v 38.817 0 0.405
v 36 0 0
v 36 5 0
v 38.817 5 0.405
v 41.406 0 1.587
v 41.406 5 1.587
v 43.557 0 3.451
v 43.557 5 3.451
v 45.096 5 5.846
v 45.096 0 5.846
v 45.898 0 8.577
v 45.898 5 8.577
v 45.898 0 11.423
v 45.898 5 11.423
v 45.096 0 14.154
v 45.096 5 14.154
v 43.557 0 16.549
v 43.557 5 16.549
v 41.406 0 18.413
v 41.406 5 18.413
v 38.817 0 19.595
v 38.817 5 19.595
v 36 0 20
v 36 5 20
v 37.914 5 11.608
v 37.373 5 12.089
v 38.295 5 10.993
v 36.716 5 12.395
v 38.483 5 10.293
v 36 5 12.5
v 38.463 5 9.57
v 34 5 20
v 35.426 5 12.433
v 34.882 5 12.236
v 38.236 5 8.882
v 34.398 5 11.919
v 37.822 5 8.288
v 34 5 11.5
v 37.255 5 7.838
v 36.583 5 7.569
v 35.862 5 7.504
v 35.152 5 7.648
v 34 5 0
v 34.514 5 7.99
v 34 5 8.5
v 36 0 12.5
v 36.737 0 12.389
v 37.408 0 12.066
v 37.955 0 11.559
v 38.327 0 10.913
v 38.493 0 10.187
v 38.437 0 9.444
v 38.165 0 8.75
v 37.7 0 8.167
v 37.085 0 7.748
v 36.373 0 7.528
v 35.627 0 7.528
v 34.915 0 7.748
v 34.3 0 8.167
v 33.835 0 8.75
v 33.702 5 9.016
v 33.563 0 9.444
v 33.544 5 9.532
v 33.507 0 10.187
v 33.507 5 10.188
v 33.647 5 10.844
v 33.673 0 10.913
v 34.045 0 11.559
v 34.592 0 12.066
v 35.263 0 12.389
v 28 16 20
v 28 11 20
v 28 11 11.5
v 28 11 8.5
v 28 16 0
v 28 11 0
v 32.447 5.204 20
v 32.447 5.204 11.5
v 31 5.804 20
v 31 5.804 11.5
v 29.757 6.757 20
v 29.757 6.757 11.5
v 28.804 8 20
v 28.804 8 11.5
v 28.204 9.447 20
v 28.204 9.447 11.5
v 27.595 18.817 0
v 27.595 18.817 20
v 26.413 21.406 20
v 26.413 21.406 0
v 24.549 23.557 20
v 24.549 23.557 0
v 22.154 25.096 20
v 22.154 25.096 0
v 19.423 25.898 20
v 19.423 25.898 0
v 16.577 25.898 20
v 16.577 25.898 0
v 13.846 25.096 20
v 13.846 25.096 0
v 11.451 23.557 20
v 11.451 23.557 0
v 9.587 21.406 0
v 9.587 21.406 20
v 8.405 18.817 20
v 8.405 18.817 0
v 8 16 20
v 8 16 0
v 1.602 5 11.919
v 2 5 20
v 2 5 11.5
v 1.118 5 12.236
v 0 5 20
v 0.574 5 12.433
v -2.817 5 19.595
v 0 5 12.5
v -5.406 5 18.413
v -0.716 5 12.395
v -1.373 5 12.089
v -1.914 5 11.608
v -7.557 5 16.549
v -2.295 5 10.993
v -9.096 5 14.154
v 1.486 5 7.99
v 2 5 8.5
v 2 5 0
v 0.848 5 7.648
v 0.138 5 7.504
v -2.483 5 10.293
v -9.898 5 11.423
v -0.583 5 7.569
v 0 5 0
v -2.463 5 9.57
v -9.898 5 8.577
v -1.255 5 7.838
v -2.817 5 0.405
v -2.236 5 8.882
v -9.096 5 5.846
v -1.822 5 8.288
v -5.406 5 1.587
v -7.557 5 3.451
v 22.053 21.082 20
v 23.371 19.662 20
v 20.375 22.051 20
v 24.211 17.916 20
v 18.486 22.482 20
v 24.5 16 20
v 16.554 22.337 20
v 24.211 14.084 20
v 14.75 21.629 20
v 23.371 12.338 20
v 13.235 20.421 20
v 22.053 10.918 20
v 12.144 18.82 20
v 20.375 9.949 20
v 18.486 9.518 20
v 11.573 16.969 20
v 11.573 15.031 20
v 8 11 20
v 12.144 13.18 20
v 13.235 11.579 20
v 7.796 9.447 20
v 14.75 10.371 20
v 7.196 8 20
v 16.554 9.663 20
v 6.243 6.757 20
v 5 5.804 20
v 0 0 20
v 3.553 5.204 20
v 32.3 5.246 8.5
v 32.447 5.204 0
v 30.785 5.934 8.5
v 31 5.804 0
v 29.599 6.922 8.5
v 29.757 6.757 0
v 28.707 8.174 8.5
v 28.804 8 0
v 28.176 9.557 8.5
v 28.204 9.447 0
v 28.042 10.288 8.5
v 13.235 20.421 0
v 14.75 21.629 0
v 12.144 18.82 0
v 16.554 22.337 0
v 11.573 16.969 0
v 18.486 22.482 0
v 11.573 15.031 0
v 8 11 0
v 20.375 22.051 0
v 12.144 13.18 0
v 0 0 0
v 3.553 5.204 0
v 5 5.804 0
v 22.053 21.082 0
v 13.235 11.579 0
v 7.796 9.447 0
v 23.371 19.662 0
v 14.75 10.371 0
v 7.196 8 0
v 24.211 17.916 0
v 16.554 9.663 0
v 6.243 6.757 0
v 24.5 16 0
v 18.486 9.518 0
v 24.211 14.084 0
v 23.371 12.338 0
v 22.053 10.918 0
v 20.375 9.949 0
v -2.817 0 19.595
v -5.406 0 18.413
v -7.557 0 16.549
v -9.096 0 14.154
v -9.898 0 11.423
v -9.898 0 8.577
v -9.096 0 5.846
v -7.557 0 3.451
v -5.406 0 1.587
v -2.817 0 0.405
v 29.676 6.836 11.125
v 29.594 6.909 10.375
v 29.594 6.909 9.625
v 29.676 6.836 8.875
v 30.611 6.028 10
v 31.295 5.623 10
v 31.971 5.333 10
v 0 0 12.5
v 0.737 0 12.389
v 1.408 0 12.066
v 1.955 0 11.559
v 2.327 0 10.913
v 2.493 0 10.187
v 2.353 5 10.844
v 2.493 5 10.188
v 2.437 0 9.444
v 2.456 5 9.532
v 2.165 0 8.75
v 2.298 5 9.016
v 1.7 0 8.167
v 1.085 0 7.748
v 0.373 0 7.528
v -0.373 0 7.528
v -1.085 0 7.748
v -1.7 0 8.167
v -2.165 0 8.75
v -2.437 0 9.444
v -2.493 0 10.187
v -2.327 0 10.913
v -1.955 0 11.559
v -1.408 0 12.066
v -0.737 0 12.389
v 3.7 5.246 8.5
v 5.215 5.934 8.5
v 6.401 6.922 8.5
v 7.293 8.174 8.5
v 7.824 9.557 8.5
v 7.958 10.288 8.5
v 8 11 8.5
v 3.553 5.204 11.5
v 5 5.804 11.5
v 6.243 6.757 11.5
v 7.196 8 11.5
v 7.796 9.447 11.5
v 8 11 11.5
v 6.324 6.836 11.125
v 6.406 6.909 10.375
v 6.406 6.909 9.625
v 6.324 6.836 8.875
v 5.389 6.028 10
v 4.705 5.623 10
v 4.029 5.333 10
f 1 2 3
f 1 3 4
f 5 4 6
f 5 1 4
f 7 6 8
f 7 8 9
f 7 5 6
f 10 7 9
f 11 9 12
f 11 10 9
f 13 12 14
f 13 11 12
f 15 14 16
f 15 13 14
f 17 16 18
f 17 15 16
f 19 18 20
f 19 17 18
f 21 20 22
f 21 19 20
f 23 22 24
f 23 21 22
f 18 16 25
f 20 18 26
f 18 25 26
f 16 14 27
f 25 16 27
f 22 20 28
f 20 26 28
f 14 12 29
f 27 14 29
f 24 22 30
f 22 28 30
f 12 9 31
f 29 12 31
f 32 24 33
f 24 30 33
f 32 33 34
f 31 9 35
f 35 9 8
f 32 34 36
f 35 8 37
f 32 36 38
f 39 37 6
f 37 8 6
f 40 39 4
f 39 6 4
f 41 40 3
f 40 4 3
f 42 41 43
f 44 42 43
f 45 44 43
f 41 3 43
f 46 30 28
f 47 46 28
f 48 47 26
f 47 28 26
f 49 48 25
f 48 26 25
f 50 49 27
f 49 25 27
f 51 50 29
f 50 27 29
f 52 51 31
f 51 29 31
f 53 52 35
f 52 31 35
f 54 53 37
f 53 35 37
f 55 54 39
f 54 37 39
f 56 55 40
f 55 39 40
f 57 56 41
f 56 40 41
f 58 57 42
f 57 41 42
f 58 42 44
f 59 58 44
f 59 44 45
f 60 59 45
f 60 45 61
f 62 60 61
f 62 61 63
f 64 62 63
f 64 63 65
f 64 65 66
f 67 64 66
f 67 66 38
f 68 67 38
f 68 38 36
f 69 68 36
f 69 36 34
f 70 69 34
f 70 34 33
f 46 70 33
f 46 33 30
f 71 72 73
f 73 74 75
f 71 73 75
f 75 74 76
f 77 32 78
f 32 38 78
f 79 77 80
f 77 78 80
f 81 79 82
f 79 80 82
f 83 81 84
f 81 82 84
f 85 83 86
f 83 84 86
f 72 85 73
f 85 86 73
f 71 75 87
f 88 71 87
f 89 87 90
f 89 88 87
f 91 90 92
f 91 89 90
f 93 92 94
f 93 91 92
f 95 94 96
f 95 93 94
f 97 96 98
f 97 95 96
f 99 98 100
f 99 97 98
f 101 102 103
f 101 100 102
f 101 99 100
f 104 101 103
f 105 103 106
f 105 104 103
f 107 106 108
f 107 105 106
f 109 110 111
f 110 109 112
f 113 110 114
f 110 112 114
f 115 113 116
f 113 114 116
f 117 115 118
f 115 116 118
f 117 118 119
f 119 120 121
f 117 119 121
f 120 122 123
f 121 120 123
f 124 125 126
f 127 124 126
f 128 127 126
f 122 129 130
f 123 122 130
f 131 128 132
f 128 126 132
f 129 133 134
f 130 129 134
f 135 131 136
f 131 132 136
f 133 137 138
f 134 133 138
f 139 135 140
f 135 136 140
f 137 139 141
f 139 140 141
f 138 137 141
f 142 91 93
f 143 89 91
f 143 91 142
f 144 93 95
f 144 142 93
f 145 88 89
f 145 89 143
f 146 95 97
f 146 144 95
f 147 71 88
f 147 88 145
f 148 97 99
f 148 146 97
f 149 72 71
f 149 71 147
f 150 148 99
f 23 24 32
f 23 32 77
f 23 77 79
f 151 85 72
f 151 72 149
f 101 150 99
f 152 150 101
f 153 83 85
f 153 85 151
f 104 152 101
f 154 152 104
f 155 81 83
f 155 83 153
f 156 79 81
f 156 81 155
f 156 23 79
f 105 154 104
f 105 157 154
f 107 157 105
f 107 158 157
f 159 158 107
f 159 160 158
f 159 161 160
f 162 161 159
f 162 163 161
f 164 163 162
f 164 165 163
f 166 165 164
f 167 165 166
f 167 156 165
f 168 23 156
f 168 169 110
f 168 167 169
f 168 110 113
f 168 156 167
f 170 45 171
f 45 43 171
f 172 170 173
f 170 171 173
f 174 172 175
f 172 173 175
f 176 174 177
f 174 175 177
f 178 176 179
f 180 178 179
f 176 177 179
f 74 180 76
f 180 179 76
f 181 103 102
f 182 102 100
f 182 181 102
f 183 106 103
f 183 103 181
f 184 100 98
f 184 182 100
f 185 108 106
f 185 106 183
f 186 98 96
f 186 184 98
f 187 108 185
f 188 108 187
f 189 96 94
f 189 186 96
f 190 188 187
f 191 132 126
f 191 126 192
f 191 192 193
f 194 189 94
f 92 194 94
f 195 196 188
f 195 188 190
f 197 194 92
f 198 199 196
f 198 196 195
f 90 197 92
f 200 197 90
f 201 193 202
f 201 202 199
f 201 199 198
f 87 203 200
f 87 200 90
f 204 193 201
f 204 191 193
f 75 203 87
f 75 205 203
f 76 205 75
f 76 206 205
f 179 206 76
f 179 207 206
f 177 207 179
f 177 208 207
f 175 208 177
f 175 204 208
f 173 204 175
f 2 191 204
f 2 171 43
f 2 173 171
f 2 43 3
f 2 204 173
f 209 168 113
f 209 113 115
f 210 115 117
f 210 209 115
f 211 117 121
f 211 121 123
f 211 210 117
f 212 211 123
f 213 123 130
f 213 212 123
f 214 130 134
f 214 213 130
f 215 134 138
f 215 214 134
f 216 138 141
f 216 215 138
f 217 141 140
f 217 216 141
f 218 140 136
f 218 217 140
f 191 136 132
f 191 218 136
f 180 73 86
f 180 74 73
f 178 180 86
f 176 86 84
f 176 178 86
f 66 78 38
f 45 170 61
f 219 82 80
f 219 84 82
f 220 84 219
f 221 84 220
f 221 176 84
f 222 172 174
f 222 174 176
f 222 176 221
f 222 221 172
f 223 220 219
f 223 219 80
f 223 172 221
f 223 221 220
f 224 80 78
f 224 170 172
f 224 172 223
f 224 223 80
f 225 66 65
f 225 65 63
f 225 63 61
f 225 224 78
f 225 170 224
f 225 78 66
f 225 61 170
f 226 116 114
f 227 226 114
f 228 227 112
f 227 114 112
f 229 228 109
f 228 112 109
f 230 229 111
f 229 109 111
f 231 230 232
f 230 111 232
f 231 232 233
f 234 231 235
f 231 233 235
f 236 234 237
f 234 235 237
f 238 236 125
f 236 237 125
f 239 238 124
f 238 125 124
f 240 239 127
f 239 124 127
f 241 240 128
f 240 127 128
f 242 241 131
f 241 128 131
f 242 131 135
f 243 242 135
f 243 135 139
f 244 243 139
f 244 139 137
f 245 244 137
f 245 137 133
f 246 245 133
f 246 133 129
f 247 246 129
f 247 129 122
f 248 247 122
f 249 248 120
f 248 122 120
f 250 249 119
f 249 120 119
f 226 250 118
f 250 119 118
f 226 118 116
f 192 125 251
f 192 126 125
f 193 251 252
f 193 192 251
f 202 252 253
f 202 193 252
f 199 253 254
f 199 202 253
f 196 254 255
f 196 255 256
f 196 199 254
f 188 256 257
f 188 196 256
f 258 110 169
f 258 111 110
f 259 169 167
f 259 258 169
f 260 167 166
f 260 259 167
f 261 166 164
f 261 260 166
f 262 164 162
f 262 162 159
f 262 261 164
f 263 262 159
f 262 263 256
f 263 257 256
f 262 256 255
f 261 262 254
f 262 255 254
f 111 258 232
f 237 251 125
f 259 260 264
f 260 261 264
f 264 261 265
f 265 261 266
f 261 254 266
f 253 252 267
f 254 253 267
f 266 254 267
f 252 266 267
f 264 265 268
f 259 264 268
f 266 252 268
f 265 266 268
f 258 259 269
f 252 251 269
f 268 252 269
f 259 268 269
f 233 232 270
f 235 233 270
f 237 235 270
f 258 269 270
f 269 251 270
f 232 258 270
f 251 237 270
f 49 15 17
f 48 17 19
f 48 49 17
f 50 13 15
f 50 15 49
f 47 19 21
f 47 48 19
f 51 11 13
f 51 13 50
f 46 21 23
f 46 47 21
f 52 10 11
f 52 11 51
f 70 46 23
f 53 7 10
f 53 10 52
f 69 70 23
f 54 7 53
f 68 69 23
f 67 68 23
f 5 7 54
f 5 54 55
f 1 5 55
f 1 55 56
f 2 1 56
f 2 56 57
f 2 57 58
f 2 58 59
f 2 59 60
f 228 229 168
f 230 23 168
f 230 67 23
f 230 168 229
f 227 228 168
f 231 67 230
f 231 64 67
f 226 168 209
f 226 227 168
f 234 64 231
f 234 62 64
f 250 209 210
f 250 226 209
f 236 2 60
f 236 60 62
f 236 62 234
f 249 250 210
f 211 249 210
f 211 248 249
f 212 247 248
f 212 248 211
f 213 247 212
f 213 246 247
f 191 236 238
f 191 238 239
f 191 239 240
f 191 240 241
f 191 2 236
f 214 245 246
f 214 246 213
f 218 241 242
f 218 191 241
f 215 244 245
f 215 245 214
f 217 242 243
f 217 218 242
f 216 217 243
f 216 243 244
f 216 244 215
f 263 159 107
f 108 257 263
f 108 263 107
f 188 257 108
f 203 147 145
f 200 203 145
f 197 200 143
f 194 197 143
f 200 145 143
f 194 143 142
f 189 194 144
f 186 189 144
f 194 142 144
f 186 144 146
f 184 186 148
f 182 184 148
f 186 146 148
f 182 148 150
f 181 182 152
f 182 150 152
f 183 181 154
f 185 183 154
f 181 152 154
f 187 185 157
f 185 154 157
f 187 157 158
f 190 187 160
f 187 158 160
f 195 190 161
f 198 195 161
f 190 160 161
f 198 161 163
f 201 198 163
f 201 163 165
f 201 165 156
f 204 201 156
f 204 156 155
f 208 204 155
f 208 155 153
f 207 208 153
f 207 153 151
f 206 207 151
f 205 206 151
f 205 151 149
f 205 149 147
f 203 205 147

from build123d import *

# Parameters (mm, degrees)
ESTRUSIONE_ESTRUSIONE1_DEPTH = 5
SCHIZZO2_W                   = 20
SCHIZZO2_H                   = 20
ESTRUSIONE_ESTRUSIONE2_DEPTH = 21
RACCORDO1_RADIUS             = 10
RACCORDO1_LENGTH             = 20
SCHIZZO5_R                   = 6.5
TAGLIO_ESTRUSIONE4_DEPTH     = 57.497787567
SCHIZZO6_R                   = 2.5
TAGLIO_ESTRUSIONE5_DEPTH     = 55.378304497
RACCORDO2_R                  = 6


with BuildPart() as part:
    # Schizzo1 → Estrusione-Estrusione1 (new body)
    with BuildSketch(Plane(origin=(0, 0, 0), x_dir=(1, 0, 0), z_dir=(0, 1, 0))):
        with BuildLine():
            Line((0, 0), (36, 0))
            ThreePointArc((36, 0), (46, -10), (36, -20))
            Line((36, -20), (0, -20))
            ThreePointArc((0, -20), (-10, -10), (0, 0))
        make_face()
    extrude(amount=ESTRUSIONE_ESTRUSIONE1_DEPTH)

    # Schizzo2 → Estrusione-Estrusione2 (add)
    with BuildSketch(Plane(origin=(0, 5, 0), x_dir=(1, 0, 0), z_dir=(0, 1, 0))):
        with Locations((18, -10)):
            Rectangle(SCHIZZO2_W, SCHIZZO2_H)
    extrude(amount=ESTRUSIONE_ESTRUSIONE2_DEPTH)

    # Raccordo1: full round fillet: the end face becomes a half cylinder, R = half its width
    raccordo1_face = Plane((18, 26, 10), x_dir=(0, 0, 1), z_dir=(0, 1, 0))  # on the end face: x along it, z out of the body
    raccordo1_slab = raccordo1_face.offset(-RACCORDO1_RADIUS / 2) * Box(RACCORDO1_LENGTH, 2 * RACCORDO1_RADIUS, RACCORDO1_RADIUS, mode=Mode.PRIVATE)  # the body's end, R deep
    raccordo1_round = Plane((18, 16, 10), x_dir=(0, 1, 0), z_dir=(0, 0, 1)) * Cylinder(RACCORDO1_RADIUS, RACCORDO1_LENGTH, mode=Mode.PRIVATE)  # its axis R under the face
    add(raccordo1_slab - raccordo1_round, mode=Mode.SUBTRACT)

    # Schizzo5 → Taglio-Estrusione4 (cut, through all)
    with BuildSketch(Plane.XY.offset(20)):
        with Locations((18, 16)):
            Circle(SCHIZZO5_R)
    extrude(amount=-TAGLIO_ESTRUSIONE4_DEPTH, mode=Mode.SUBTRACT)

    # Schizzo6 → Taglio-Estrusione5 (cut, through all)
    with BuildSketch(Plane(origin=(0, 5, 0), x_dir=(1, 0, 0), z_dir=(0, 1, 0))):
        with Locations(Location((0, -10, 0), (0, 0, 270))):
            Circle(SCHIZZO6_R)
        with Locations(Location((36, -10, 0), (0, 0, 270))):
            Circle(SCHIZZO6_R)
    extrude(amount=-TAGLIO_ESTRUSIONE5_DEPTH, mode=Mode.SUBTRACT)

    # Raccordo2
    raccordo2_edges = [part.edges().sort_by_distance(p)[0] for p in [
        (8, 5, 10),
        (28, 5, 10),
    ]]
    fillet(raccordo2_edges, radius=RACCORDO2_R)


solid = part.part
